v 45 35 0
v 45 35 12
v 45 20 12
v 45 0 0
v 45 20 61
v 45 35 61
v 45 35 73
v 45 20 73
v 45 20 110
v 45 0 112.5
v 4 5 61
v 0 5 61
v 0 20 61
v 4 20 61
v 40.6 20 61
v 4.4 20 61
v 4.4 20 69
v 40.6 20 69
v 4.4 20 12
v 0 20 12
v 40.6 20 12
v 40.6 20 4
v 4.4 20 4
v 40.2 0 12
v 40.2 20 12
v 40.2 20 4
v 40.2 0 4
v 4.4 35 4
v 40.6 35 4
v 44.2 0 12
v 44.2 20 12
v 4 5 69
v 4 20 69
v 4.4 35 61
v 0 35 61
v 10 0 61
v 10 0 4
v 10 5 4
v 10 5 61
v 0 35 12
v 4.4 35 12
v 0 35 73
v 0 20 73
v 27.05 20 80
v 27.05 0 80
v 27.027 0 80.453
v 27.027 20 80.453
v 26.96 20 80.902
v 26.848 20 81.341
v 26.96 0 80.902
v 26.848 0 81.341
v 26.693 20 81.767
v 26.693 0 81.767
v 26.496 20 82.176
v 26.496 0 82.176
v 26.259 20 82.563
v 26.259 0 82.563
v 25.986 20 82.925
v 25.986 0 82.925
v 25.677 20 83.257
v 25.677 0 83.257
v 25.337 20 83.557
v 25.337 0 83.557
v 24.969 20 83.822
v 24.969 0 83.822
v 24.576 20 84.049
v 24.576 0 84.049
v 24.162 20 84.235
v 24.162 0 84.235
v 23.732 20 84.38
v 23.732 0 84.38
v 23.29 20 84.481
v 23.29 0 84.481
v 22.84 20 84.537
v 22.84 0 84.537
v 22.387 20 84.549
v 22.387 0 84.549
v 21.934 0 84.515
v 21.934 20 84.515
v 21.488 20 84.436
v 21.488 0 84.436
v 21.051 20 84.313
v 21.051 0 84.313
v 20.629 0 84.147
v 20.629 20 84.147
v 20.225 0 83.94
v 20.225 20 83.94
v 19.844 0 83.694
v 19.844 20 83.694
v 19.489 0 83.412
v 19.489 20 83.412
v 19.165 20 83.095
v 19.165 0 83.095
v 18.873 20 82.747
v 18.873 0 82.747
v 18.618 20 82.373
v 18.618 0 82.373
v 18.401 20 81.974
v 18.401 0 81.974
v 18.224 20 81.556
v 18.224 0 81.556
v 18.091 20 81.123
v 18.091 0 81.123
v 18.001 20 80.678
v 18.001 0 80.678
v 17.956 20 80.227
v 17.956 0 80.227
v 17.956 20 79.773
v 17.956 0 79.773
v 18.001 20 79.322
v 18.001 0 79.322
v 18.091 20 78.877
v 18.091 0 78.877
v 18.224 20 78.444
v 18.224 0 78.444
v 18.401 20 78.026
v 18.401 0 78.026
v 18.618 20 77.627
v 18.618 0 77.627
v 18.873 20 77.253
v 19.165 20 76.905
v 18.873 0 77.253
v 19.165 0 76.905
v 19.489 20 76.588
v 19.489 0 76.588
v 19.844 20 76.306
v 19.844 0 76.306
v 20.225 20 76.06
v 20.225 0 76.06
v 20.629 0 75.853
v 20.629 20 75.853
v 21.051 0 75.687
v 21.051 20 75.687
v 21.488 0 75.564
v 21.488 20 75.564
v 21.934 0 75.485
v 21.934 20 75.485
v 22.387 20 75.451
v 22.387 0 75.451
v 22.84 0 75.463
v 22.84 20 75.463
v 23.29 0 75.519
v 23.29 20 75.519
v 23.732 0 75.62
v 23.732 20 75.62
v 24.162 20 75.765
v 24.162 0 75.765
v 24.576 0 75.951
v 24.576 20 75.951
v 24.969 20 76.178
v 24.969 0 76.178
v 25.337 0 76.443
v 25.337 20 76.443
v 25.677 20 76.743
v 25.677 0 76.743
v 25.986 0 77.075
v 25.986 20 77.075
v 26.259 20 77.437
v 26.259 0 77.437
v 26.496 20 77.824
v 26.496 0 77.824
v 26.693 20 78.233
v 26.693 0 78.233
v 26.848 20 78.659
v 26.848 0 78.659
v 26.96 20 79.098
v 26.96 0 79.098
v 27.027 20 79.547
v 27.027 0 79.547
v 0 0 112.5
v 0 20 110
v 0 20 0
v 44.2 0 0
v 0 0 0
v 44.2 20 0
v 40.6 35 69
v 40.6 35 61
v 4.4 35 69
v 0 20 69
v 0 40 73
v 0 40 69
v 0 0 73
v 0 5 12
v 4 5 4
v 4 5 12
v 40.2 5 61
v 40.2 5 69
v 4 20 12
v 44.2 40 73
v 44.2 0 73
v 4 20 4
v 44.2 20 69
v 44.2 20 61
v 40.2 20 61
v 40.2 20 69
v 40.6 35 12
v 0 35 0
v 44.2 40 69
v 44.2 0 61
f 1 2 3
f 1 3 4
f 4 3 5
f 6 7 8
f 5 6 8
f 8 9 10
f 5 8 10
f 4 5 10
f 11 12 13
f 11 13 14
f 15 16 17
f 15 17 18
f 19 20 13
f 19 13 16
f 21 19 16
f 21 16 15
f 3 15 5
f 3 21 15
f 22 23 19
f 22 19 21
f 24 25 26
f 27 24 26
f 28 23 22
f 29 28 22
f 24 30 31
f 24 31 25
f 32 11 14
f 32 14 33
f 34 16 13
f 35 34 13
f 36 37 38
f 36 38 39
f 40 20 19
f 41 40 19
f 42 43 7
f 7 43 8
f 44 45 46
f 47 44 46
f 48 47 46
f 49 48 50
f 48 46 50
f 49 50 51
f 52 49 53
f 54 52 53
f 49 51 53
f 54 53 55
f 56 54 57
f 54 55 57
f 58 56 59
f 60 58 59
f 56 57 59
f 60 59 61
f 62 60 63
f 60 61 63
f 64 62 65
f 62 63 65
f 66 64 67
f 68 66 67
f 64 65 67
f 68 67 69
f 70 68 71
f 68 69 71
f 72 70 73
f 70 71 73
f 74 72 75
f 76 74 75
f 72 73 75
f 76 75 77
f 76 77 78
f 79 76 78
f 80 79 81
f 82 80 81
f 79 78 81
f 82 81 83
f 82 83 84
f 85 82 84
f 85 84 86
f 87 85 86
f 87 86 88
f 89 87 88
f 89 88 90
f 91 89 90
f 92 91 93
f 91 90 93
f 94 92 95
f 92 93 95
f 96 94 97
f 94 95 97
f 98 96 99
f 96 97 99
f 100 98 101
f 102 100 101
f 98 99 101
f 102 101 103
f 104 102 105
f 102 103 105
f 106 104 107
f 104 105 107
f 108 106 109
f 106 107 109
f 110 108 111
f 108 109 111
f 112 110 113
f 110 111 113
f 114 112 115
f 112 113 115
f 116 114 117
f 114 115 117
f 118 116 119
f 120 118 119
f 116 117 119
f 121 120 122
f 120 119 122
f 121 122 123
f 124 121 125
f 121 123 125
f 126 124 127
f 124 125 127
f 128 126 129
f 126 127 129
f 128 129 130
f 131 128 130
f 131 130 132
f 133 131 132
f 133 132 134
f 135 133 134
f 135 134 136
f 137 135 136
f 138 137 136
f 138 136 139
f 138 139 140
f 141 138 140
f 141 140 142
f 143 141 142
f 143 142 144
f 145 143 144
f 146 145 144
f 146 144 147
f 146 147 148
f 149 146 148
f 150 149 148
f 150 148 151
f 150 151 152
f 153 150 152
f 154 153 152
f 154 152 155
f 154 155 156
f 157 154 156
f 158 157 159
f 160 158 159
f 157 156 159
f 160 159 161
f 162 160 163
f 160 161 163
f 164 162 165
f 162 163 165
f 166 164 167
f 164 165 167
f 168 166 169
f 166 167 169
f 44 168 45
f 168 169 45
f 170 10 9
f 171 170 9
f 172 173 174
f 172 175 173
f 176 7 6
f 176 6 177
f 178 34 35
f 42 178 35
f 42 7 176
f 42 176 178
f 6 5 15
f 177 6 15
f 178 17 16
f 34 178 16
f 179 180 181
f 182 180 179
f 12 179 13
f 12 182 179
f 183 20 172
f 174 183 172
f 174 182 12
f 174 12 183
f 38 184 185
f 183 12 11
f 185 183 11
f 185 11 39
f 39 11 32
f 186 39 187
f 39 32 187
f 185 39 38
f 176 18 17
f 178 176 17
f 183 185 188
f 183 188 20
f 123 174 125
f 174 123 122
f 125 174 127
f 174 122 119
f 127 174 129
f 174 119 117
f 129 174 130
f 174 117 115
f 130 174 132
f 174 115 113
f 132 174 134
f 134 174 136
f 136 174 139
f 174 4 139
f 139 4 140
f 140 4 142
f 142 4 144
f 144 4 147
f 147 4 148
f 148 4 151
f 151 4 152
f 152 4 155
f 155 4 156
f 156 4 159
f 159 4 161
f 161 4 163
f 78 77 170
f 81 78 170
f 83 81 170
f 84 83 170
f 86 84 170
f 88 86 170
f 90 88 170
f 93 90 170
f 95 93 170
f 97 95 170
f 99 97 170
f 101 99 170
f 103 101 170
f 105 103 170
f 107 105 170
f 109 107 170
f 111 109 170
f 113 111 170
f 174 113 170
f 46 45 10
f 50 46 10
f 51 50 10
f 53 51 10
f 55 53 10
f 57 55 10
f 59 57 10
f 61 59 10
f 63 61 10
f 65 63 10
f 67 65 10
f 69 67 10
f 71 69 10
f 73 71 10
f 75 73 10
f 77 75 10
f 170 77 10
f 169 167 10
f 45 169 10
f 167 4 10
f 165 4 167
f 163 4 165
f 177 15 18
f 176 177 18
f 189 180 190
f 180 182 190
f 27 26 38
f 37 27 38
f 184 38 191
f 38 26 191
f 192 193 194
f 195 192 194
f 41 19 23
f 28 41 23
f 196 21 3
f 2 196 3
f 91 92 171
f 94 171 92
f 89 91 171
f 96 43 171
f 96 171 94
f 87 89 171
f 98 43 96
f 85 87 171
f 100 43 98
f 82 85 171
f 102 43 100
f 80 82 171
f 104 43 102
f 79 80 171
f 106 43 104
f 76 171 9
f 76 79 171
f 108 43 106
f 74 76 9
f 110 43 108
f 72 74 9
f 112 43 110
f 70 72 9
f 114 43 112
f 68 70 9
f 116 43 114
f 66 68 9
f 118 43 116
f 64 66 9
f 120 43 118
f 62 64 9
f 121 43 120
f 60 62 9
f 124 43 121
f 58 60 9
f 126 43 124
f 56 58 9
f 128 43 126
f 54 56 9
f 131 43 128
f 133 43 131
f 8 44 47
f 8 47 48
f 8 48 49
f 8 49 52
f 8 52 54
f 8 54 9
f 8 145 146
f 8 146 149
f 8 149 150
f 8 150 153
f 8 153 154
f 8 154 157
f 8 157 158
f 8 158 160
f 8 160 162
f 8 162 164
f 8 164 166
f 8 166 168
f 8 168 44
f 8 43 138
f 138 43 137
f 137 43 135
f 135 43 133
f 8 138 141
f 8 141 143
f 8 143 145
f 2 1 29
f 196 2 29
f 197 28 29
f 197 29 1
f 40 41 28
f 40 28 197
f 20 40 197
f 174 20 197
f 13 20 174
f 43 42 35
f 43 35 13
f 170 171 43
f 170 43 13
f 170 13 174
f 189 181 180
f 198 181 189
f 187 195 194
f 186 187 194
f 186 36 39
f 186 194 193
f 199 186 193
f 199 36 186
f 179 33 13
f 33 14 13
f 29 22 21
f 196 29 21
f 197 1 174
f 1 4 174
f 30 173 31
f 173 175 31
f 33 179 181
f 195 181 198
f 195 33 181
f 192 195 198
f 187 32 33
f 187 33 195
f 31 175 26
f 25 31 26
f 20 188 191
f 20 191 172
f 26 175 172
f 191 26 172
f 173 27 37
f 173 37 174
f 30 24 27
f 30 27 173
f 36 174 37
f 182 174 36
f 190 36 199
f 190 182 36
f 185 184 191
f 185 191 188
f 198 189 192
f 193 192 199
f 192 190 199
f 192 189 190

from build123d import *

# Parameters (mm, degrees)
SKETCH_W     = 45
SKETCH_H     = 20
PAD_DEPTH    = 110
PAD001_DEPTH = 45
SKETCH002_R  = 4.55
POCKET_DEPTH = 20
PAD002_DEPTH = 15
PAD003_DEPTH = 15
SKETCH005_W  = 10
SKETCH005_H  = 73
PAD004_DEPTH = 5
PAD005_DEPTH = 15
PAD006_DEPTH = 5
PAD007_DEPTH = 15
PAD008_DEPTH = 5
SKETCH008_W  = 44.2
SKETCH008_H  = 4
PAD009_DEPTH = 20
SKETCH009_W  = 30.2
SKETCH009_H  = 5
PAD010_DEPTH = 8


with BuildPart() as body:
    # Sketch → Pad (new body)
    with BuildSketch(Plane.XY):
        with Locations((22.5, 10)):
            Rectangle(SKETCH_W, SKETCH_H)
    extrude(amount=PAD_DEPTH)

    # Sketch001 (on Face2 of Pad) → Pad001 (join)
    with BuildSketch(Plane.YZ.offset(45)):
        Polygon((0, 110), (0, 112.5), (20, 110), align=None)
    extrude(amount=-PAD001_DEPTH)

    # Sketch002 (on Face6 of Pad001) → Pocket (cut)
    with BuildSketch(Plane.XZ):
        with Locations((22.5, 80)):
            Circle(SKETCH002_R)
    extrude(amount=-POCKET_DEPTH, mode=Mode.SUBTRACT)

    # Sketch003 (on Face1 of Pocket) → Pad002 (join)
    with BuildSketch(Plane(origin=(0, 20, 0), x_dir=(-1, 0, 0), z_dir=(0, 1, 0))):
        Polygon((-4.4, 4), (-40.6, 4), (-40.6, 12), (-45, 12), (-45, 0), (0, 0), (0, 12), (-4.4, 12), align=None)
    extrude(amount=PAD002_DEPTH)

    # Sketch004 (on Face1 of Pad002) → Pad003 (join)
    with BuildSketch(Plane(origin=(0, 20, 0), x_dir=(-1, 0, 0), z_dir=(0, 1, 0))):
        Polygon((0, 73), (-45, 73), (-45, 61), (-40.6, 61), (-40.6, 69), (-4.4, 69), (-4.4, 61), (0, 61), align=None)
    extrude(amount=PAD003_DEPTH)


with BuildPart() as batteryrearmotorholder001:
    # Sketch005 → Pad004 (new body)
    with BuildSketch(Plane.XZ):
        with Locations((5, 36.5)):
            Rectangle(SKETCH005_W, SKETCH005_H)
    extrude(amount=-PAD004_DEPTH)

    # Sketch006 (on Face6 of Pad004) → Pad005 (join)
    with BuildSketch(Plane(origin=(0, 5, 0), x_dir=(1, 0, 0), z_dir=(0, 1, 0))):
        Polygon((0, 0), (10, 0), (44.2, 0), (44.2, -12), (40.2, -12), (40.2, -4), (4, -4), (4, -12), (0, -12), align=None)
    extrude(amount=PAD005_DEPTH)

    # Sketch006 (on Face6 of Pad004) → Pad006 (join)
    with BuildSketch(Plane(origin=(0, 5, 0), x_dir=(1, 0, 0), z_dir=(0, 1, 0))):
        Polygon((0, 0), (10, 0), (44.2, 0), (44.2, -12), (40.2, -12), (40.2, -4), (4, -4), (4, -12), (0, -12), align=None)
    extrude(amount=-PAD006_DEPTH)

    # Sketch007 (on Face6 of Pad004) → Pad007 (join)
    with BuildSketch(Plane(origin=(0, 5, 0), x_dir=(1, 0, 0), z_dir=(0, 1, 0))):
        Polygon((0, -73), (0, -61), (4, -61), (4, -69), (40.2, -69), (40.2, -61), (44.2, -61), (44.2, -73), align=None)
    extrude(amount=PAD007_DEPTH)

    # Sketch007 (on Face6 of Pad004) → Pad008 (join)
    with BuildSketch(Plane(origin=(0, 5, 0), x_dir=(1, 0, 0), z_dir=(0, 1, 0))):
        Polygon((0, -73), (0, -61), (4, -61), (4, -69), (40.2, -69), (40.2, -61), (44.2, -61), (44.2, -73), align=None)
    extrude(amount=-PAD008_DEPTH)

    # Sketch008 (on Face33 of Pad008) → Pad009 (join)
    with BuildSketch(Plane(origin=(0, 20, 0), x_dir=(1, 0, 0), z_dir=(0, 1, 0))):
        with Locations((22.1, -71)):
            Rectangle(SKETCH008_W, SKETCH008_H)
    extrude(amount=PAD009_DEPTH)

    # Sketch009 (on Face32 of Pad009) → Pad010 (join)
    with BuildSketch(Plane(origin=(0, 0, 69), x_dir=(1, 0, 0), z_dir=(0, 0, -1))):
        with Locations((25.1, -2.5)):
            Rectangle(SKETCH009_W, SKETCH009_H)
    extrude(amount=PAD010_DEPTH)


solid = Compound([body.part, batteryrearmotorholder001.part])
